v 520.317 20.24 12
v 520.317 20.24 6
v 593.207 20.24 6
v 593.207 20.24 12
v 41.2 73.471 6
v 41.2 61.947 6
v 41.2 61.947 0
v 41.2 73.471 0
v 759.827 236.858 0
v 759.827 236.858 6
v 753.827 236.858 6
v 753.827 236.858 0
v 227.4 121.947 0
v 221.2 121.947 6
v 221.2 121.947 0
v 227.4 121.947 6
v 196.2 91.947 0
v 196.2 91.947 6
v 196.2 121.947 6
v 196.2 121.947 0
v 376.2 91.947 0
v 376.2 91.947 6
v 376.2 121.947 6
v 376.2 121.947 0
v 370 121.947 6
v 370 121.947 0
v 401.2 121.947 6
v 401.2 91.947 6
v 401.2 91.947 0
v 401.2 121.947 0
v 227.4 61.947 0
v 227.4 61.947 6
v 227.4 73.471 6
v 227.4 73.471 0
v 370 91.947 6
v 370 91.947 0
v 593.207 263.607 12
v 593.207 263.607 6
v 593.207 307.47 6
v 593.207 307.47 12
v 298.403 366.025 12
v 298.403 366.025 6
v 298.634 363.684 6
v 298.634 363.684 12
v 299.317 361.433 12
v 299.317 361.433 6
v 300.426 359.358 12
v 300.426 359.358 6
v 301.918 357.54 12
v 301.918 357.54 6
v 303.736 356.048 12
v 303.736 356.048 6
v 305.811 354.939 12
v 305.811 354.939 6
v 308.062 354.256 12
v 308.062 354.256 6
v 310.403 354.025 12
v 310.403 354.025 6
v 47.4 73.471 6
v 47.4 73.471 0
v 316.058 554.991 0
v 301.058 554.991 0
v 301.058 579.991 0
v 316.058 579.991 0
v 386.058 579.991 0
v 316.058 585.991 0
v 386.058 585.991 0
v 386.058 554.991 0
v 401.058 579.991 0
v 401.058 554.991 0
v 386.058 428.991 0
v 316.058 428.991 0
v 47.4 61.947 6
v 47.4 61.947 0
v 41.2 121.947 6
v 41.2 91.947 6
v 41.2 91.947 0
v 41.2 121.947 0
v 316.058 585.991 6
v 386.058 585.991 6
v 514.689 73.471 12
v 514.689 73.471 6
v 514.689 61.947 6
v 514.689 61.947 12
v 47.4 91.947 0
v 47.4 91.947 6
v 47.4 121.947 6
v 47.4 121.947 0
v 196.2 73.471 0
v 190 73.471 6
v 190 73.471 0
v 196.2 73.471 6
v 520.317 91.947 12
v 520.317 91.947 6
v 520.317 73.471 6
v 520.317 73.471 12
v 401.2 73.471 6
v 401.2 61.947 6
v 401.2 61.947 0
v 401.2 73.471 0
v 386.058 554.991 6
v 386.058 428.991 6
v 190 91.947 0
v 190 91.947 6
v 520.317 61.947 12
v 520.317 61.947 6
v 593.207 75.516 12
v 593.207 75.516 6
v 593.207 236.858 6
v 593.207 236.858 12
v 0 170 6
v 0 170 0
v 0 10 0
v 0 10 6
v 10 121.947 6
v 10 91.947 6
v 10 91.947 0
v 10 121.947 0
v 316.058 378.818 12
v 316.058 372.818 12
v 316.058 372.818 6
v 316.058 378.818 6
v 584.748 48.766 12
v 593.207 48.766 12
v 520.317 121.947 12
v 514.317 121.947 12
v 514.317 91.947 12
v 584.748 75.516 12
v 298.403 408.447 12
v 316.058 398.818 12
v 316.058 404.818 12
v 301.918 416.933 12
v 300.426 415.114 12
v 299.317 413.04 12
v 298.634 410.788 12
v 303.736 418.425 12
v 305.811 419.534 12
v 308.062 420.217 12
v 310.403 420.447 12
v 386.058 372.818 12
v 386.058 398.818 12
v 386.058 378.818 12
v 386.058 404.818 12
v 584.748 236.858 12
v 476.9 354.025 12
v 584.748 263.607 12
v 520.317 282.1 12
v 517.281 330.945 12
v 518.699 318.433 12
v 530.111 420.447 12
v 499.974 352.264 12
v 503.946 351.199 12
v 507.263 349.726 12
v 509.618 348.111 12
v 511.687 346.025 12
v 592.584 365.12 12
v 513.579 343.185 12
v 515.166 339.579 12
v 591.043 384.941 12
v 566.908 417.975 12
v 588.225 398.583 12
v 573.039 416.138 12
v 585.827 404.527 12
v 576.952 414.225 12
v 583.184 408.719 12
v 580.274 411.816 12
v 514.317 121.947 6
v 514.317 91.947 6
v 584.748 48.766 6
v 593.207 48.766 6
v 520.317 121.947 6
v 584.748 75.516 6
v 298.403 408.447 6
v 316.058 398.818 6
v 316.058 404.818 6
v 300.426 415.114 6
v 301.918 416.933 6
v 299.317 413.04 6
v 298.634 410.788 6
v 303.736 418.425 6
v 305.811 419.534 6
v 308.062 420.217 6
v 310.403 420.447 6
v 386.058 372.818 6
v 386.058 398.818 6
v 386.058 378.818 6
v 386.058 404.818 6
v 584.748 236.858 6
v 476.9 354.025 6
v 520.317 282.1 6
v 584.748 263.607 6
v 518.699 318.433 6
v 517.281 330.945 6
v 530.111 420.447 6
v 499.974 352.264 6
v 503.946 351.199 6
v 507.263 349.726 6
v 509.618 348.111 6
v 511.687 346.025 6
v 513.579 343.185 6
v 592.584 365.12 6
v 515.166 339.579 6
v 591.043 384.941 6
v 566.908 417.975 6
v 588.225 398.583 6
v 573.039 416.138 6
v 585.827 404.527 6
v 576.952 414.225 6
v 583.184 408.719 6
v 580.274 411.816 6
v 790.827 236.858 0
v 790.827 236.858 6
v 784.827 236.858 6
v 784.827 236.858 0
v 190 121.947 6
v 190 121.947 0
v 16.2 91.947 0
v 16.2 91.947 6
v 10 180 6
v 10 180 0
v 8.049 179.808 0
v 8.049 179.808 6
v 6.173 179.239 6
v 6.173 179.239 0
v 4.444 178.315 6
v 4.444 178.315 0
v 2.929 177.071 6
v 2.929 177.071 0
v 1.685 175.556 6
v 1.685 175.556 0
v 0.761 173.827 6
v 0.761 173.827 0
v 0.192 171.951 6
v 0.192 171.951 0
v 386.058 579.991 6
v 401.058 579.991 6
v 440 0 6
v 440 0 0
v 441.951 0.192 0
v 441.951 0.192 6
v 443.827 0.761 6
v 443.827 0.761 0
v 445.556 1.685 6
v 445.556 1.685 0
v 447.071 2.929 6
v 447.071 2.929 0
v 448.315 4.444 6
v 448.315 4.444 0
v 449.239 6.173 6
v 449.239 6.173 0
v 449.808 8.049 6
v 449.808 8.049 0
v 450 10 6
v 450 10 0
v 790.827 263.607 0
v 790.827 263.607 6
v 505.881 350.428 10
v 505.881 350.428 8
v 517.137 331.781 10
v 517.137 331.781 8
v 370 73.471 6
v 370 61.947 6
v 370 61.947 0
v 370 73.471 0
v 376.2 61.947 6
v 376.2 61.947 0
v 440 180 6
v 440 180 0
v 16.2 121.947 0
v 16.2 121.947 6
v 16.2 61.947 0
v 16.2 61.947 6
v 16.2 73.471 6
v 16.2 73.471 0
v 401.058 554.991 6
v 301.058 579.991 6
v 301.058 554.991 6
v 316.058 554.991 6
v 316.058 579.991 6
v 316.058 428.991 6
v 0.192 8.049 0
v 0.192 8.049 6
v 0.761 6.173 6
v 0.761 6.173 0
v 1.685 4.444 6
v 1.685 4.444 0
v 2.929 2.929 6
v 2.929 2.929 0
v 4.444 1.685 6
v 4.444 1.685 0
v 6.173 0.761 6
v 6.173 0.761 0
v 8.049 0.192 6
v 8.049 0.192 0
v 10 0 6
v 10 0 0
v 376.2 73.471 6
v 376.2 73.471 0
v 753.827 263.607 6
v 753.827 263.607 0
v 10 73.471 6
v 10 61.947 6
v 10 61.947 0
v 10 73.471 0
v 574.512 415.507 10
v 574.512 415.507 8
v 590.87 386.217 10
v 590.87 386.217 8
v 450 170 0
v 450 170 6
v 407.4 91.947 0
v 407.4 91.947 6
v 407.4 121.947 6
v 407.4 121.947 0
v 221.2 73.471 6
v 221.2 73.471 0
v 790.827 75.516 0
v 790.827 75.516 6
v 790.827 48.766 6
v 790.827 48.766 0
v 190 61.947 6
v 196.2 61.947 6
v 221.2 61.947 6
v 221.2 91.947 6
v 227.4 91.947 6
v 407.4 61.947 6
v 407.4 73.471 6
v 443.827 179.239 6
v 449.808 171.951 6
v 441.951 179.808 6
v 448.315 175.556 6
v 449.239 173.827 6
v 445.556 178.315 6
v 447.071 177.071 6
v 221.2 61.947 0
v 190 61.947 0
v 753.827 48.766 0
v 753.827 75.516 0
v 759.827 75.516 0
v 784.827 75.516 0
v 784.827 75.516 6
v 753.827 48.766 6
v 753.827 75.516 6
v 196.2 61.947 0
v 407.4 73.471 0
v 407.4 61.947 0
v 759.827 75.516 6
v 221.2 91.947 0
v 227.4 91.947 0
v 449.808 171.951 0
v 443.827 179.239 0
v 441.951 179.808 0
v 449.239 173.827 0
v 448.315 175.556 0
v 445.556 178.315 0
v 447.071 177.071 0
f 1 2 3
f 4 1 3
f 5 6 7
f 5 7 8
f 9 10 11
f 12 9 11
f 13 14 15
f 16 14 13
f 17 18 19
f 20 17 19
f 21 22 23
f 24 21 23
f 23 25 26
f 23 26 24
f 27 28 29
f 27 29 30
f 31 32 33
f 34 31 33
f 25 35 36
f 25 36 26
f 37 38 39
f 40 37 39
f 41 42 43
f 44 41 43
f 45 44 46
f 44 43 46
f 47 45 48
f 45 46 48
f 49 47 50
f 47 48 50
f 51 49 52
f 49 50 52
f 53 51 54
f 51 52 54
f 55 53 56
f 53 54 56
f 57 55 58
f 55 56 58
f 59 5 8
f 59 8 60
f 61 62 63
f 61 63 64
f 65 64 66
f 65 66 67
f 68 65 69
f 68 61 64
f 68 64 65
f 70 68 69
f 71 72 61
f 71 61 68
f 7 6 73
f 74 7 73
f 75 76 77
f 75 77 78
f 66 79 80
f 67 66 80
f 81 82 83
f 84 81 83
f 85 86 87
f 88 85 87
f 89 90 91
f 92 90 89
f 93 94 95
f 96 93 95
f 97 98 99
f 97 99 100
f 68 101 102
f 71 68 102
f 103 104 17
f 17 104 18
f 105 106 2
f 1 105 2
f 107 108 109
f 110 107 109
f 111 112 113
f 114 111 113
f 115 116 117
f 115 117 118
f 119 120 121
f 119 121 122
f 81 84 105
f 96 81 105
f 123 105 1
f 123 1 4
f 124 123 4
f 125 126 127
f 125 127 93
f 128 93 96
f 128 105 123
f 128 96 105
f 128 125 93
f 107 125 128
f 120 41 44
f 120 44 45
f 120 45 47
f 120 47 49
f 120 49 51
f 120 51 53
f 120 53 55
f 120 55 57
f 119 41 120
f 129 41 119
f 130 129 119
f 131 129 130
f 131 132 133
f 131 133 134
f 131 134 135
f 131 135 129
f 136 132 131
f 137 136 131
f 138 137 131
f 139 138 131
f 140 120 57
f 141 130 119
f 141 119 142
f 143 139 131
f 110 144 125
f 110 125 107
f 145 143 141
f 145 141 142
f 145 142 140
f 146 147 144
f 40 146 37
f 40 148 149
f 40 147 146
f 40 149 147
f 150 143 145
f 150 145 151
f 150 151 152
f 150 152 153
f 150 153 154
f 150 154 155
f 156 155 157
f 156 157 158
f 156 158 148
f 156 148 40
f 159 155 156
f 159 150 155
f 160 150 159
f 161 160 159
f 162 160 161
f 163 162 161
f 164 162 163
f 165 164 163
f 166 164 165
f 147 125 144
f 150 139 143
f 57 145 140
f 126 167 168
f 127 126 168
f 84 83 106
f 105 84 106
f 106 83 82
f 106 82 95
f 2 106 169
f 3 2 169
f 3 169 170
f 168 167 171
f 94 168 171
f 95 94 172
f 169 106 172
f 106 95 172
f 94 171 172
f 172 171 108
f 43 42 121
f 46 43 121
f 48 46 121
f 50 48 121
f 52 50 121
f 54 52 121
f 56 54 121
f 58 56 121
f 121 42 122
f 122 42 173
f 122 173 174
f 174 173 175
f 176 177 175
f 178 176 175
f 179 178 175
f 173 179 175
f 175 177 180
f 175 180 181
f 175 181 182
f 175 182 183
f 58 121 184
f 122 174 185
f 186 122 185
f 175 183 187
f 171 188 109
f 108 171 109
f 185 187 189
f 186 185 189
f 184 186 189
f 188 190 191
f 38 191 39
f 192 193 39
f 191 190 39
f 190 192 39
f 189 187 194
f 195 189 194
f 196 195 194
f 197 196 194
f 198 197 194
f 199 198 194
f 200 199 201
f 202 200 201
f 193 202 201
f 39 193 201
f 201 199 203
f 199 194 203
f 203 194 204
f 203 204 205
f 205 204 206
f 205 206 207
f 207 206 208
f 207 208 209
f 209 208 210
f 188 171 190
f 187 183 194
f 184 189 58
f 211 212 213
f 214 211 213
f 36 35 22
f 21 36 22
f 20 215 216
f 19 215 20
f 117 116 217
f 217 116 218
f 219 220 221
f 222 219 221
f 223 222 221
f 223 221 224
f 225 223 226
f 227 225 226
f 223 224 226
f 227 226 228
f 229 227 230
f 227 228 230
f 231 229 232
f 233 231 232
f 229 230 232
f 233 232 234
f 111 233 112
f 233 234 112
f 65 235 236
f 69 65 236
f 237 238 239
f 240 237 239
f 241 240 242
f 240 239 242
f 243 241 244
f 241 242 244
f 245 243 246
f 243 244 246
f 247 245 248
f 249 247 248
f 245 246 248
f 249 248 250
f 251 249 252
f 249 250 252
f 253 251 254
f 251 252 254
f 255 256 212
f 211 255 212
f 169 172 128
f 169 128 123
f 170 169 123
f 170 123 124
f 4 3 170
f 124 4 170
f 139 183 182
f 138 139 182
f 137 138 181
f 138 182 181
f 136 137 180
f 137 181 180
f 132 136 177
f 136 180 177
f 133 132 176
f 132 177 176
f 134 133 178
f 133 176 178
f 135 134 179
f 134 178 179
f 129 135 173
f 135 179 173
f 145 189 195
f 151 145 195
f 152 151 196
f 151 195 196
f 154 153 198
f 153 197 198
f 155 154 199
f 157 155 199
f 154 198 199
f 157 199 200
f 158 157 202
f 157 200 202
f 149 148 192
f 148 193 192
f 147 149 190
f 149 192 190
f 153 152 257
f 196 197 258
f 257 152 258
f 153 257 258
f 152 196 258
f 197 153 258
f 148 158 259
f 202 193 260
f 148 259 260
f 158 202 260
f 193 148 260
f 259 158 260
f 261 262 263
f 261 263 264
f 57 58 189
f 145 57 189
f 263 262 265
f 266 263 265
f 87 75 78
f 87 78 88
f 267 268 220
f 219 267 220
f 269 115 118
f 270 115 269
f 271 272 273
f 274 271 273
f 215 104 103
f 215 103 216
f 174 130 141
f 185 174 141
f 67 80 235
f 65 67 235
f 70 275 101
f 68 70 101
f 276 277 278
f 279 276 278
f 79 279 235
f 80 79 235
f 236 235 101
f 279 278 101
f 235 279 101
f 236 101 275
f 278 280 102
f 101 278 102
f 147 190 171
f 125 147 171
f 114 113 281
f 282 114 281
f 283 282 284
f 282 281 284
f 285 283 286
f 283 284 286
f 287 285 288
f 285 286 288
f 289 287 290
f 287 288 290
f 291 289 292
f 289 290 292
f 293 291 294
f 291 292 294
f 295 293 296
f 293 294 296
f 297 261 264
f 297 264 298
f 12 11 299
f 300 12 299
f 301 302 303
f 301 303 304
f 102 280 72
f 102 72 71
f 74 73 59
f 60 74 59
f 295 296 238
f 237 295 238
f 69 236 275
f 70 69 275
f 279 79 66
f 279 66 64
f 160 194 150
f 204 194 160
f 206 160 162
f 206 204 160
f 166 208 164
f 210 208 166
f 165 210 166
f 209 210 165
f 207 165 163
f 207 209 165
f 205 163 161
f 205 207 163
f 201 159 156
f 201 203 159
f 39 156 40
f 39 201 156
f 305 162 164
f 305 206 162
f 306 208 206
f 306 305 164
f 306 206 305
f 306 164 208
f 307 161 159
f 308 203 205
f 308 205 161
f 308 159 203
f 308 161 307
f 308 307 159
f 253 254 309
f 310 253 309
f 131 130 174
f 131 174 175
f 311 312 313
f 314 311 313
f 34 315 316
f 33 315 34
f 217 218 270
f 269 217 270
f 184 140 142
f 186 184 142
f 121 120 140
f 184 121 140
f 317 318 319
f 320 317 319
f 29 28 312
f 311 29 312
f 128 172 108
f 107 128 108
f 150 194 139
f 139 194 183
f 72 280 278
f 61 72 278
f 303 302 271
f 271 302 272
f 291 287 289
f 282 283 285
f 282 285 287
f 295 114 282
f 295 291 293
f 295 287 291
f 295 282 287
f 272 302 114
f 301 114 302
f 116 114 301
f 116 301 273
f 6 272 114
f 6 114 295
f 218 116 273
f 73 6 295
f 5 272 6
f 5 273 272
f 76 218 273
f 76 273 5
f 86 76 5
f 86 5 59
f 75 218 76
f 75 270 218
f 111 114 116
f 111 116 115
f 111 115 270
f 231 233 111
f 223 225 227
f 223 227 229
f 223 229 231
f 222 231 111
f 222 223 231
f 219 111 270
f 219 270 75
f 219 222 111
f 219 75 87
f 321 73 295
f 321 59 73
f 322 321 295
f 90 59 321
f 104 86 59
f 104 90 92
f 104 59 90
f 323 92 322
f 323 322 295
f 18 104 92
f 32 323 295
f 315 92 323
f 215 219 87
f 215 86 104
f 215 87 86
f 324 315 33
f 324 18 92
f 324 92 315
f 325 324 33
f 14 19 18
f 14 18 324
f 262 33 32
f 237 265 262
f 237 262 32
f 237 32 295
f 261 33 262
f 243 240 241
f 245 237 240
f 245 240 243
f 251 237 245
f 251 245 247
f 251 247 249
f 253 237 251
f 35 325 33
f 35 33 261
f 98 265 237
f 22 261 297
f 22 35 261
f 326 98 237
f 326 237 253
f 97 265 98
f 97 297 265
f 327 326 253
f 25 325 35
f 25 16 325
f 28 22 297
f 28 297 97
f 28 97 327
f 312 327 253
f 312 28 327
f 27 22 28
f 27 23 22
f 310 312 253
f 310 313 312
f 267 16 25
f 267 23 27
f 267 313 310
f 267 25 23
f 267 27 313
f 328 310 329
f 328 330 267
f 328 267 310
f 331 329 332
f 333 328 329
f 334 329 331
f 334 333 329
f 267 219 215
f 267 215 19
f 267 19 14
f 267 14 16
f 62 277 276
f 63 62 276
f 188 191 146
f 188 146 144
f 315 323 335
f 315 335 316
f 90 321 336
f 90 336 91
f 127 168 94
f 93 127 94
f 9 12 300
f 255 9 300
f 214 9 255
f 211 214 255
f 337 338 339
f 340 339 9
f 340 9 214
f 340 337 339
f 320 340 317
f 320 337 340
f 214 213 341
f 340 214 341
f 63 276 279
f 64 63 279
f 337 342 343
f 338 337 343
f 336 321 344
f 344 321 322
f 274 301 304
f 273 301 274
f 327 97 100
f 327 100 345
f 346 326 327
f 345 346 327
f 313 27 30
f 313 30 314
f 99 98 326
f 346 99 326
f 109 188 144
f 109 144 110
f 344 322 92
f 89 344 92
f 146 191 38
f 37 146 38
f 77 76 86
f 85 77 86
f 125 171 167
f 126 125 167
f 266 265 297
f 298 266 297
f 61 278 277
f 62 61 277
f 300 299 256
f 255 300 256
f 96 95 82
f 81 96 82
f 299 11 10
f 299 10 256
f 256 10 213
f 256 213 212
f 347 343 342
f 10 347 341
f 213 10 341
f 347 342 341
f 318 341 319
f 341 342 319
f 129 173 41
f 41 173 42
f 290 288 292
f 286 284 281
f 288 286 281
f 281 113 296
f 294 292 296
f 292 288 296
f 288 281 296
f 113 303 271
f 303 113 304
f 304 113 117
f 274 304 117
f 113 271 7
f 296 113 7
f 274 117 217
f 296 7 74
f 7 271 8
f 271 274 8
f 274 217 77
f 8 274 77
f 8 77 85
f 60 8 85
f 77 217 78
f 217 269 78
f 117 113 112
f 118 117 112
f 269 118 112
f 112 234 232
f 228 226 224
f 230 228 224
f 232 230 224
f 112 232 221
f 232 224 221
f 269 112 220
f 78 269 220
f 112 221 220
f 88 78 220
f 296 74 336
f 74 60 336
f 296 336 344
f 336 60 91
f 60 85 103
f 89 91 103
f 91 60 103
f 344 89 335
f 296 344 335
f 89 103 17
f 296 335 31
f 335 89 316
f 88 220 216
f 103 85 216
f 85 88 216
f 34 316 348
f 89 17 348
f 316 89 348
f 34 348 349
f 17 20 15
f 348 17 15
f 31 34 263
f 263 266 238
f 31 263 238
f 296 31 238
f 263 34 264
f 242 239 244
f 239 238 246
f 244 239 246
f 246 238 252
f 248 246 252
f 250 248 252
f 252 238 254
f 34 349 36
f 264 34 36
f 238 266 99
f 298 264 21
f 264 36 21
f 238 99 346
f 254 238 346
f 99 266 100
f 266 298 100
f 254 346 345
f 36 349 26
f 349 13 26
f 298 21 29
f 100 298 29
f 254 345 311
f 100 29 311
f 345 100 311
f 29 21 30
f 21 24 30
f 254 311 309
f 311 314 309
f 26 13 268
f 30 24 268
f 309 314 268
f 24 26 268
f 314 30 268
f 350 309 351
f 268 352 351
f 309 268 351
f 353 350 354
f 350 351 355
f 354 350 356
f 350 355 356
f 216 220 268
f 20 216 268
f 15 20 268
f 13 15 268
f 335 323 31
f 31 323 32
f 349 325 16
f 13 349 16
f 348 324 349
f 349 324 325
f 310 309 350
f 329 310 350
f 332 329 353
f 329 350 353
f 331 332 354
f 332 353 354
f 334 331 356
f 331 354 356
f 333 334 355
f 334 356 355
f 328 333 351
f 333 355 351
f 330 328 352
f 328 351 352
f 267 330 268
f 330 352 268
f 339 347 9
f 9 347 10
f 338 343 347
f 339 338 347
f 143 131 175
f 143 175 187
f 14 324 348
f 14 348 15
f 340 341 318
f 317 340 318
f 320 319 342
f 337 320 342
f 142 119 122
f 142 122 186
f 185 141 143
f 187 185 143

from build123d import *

# Parameters (mm, degrees)
F1_DEPTH  = 6
F2_W      = 6.2
F2_H      = 30
F2_H_2    = 11.5249490142
F3_DEPTH  = 25
F5_DEPTH  = 6
F6_W      = 70
F6_H      = 6
F7_DEPTH  = 25
F8_W      = 8.4585547447
F8_H      = 26.7494320869
F9_DEPTH  = 25
F11_DEPTH = 6
F12_W     = 70
F12_H     = 6
F12_H_2   = 10
F12_H_3   = 110
F13_DEPTH = 6


with BuildPart() as f1:
    # F0 (on Top) → F1 (new body)
    with BuildSketch(Plane.XY):
        with BuildLine():
            ThreePointArc((0, 10), (2.9289321881, 2.9289321881), (10, 0))
            Line((10, 0), (440, 0))
            ThreePointArc((440, 0), (447.0710678119, 2.9289321881), (450, 10))
            Line((450, 10), (450, 170))
            ThreePointArc((450, 170), (447.0710678119, 177.0710678119), (440, 180))
            Line((440, 180), (10, 180))
            ThreePointArc((10, 180), (2.9289321881, 177.0710678119), (0, 170))
            Line((0, 170), (0, 10))
        make_face()
    extrude(amount=F1_DEPTH)

    # F2 (on face) → F3 (cut)
    with BuildSketch(Plane.XY.offset(6)):
        with Locations((13.1, 106.946528554)):
            Rectangle(F2_W, F2_H)
        with Locations((13.1, 67.7090030611)):
            Rectangle(F2_W, F2_H_2)
        with Locations((44.3, 67.7090030611)):
            Rectangle(F2_W, F2_H_2)
        with Locations((44.3, 106.946528554)):
            Rectangle(F2_W, F2_H)
        with Locations((224.3, 106.946528554)):
            Rectangle(F2_W, F2_H)
        with Locations((193.1, 106.946528554)):
            Rectangle(F2_W, F2_H)
        with Locations((193.1, 67.7090030611)):
            Rectangle(F2_W, F2_H_2)
        with Locations((224.3, 67.7090030611)):
            Rectangle(F2_W, F2_H_2)
        with Locations((404.3, 106.946528554)):
            Rectangle(F2_W, F2_H)
        with Locations((373.1, 106.946528554)):
            Rectangle(F2_W, F2_H)
        with Locations((373.1, 67.7090030611)):
            Rectangle(F2_W, F2_H_2)
        with Locations((404.3, 67.7090030611)):
            Rectangle(F2_W, F2_H_2)
    extrude(amount=-F3_DEPTH, mode=Mode.SUBTRACT)


with BuildPart() as f5:
    # F4 (on face) → F5 (new body)
    with BuildSketch(Plane.XY.offset(6)):
        with BuildLine():
            Line((520.3174543032, 121.946528554), (514.3174543032, 121.946528554))
            Line((514.3174543032, 121.946528554), (514.3174543032, 91.946528554))
            Line((514.3174543032, 91.946528554), (520.3174543032, 91.946528554))
            Line((520.3174543032, 91.946528554), (520.3174543032, 73.4714775681))
            Line((520.3174543032, 73.4714775681), (514.6890902519, 73.4714775681))
            Line((514.6890902519, 73.4714775681), (514.6890902519, 61.946528554))
            Line((514.6890902519, 61.946528554), (520.3174543032, 61.946528554))
            Line((520.3174543032, 61.946528554), (520.3174543032, 20.2404288223))
            Line((520.3174543032, 20.2404288223), (593.2067036629, 20.2404288223))
            Line((593.2067036629, 20.2404288223), (593.2067036629, 307.470202446))
            add(Edge.make_bspline(
                [(530.1111537642, 420.4473876974), (593.2067036629, 419.3136692047), (593.2067036629, 419.3136692047), (593.2067036629, 307.470202446)],
                knots=[0, 0, 0, 0, 129.402058733, 129.402058733, 129.402058733, 129.402058733], degree=3))
            Line((530.1111537642, 420.4473876974), (310.4032595633, 420.4473876974))
            ThreePointArc((310.4032595633, 420.4473876974), (301.917978189, 416.9326690716), (298.4032595633, 408.4473876974))
            Line((298.4032595633, 408.4473876974), (298.4032595633, 366.0253424665))
            ThreePointArc((298.4032595633, 366.0253424665), (301.917978189, 357.5400610923), (310.4032595633, 354.0253424665))
            Line((310.4032595633, 354.0253424665), (476.9004619294, 354.0253424665))
            add(Edge.make_bspline(
                [(476.9004619294, 354.0253424665), (517.9591178894, 352.6249909422), (517.9591178894, 352.6249909422), (520.3174543032, 282.0998557823)],
                knots=[0, 0, 0, 0, 84.0137540023, 84.0137540023, 84.0137540023, 84.0137540023], degree=3))
            Line((520.3174543032, 282.0998557823), (520.3174543032, 121.946528554))
        make_face()
    extrude(amount=F5_DEPTH)

    # F6 (on face) → F7 (cut)
    with BuildSketch(Plane.XY.offset(12)):
        with Locations((351.0576683283, 401.8176653385)):
            Rectangle(F6_W, F6_H)
        with Locations((351.0576683283, 375.8176653385)):
            Rectangle(F6_W, F6_H)
    extrude(amount=-F7_DEPTH, mode=Mode.SUBTRACT)

    # F8 (on face) → F9 (cut)
    with BuildSketch(Plane(origin=(0, 0, 6), x_dir=(1, 0, 0), z_dir=(0, 0, -1))):
        with Locations((588.9774262905, -250.2325177193)):
            Rectangle(F8_W, F8_H)
        with Locations((588.9774262905, -62.1410124004)):
            Rectangle(F8_W, F8_H)
    extrude(amount=-F9_DEPTH, mode=Mode.SUBTRACT)


with BuildPart() as f11:
    # F10 (on face) → F11 (new body)
    with BuildSketch(Plane(origin=(0, 0, 6), x_dir=(1, 0, 0), z_dir=(0, 0, -1))):
        Polygon((753.8273334503, -263.6072337627), (759.8273334503, -263.6072337627), (784.8273334503, -263.6072337627), (790.8273334503, -263.6072337627), (790.8273334503, -236.8578016758), (784.8273334503, -236.8578016758), (784.8273334503, -75.5157284439), (790.8273334503, -75.5157284439), (790.8273334503, -48.7662963569), (784.8273334503, -48.7662963569), (759.8273334503, -48.7662963569), (753.8273334503, -48.7662963569), (753.8273334503, -75.5157284439), (759.8273334503, -75.5157284439), (759.8273334503, -236.8578016758), (753.8273334503, -236.8578016758), align=None)
    extrude(amount=F11_DEPTH)


with BuildPart() as f13:
    # F12 (on face) → F13 (new body)
    with BuildSketch(Plane(origin=(0, 0, 6), x_dir=(1, 0, 0), z_dir=(0, 0, -1))):
        with Locations((351.0576683283, -551.9914240837)):
            Rectangle(F12_W, F12_H)
        with Locations((351.0576683283, -543.9914240837)):
            Rectangle(F12_W, F12_H_2)
        Polygon((401.0576683283, -554.9914240837), (386.0576683283, -554.9914240837), (316.0576683283, -554.9914240837), (301.0576683283, -554.9914240837), (301.0576683283, -579.9914240837), (316.0576683283, -579.9914240837), (386.0576683283, -579.9914240837), (401.0576683283, -579.9914240837), align=None)
        with Locations((351.0576683283, -483.9914240837)):
            Rectangle(F12_W, F12_H_3)
        with Locations((351.0576683283, -582.9914240837)):
            Rectangle(F12_W, F12_H)
    extrude(amount=F13_DEPTH)


solid = Compound([f1.part, f5.part, f11.part, f13.part])
